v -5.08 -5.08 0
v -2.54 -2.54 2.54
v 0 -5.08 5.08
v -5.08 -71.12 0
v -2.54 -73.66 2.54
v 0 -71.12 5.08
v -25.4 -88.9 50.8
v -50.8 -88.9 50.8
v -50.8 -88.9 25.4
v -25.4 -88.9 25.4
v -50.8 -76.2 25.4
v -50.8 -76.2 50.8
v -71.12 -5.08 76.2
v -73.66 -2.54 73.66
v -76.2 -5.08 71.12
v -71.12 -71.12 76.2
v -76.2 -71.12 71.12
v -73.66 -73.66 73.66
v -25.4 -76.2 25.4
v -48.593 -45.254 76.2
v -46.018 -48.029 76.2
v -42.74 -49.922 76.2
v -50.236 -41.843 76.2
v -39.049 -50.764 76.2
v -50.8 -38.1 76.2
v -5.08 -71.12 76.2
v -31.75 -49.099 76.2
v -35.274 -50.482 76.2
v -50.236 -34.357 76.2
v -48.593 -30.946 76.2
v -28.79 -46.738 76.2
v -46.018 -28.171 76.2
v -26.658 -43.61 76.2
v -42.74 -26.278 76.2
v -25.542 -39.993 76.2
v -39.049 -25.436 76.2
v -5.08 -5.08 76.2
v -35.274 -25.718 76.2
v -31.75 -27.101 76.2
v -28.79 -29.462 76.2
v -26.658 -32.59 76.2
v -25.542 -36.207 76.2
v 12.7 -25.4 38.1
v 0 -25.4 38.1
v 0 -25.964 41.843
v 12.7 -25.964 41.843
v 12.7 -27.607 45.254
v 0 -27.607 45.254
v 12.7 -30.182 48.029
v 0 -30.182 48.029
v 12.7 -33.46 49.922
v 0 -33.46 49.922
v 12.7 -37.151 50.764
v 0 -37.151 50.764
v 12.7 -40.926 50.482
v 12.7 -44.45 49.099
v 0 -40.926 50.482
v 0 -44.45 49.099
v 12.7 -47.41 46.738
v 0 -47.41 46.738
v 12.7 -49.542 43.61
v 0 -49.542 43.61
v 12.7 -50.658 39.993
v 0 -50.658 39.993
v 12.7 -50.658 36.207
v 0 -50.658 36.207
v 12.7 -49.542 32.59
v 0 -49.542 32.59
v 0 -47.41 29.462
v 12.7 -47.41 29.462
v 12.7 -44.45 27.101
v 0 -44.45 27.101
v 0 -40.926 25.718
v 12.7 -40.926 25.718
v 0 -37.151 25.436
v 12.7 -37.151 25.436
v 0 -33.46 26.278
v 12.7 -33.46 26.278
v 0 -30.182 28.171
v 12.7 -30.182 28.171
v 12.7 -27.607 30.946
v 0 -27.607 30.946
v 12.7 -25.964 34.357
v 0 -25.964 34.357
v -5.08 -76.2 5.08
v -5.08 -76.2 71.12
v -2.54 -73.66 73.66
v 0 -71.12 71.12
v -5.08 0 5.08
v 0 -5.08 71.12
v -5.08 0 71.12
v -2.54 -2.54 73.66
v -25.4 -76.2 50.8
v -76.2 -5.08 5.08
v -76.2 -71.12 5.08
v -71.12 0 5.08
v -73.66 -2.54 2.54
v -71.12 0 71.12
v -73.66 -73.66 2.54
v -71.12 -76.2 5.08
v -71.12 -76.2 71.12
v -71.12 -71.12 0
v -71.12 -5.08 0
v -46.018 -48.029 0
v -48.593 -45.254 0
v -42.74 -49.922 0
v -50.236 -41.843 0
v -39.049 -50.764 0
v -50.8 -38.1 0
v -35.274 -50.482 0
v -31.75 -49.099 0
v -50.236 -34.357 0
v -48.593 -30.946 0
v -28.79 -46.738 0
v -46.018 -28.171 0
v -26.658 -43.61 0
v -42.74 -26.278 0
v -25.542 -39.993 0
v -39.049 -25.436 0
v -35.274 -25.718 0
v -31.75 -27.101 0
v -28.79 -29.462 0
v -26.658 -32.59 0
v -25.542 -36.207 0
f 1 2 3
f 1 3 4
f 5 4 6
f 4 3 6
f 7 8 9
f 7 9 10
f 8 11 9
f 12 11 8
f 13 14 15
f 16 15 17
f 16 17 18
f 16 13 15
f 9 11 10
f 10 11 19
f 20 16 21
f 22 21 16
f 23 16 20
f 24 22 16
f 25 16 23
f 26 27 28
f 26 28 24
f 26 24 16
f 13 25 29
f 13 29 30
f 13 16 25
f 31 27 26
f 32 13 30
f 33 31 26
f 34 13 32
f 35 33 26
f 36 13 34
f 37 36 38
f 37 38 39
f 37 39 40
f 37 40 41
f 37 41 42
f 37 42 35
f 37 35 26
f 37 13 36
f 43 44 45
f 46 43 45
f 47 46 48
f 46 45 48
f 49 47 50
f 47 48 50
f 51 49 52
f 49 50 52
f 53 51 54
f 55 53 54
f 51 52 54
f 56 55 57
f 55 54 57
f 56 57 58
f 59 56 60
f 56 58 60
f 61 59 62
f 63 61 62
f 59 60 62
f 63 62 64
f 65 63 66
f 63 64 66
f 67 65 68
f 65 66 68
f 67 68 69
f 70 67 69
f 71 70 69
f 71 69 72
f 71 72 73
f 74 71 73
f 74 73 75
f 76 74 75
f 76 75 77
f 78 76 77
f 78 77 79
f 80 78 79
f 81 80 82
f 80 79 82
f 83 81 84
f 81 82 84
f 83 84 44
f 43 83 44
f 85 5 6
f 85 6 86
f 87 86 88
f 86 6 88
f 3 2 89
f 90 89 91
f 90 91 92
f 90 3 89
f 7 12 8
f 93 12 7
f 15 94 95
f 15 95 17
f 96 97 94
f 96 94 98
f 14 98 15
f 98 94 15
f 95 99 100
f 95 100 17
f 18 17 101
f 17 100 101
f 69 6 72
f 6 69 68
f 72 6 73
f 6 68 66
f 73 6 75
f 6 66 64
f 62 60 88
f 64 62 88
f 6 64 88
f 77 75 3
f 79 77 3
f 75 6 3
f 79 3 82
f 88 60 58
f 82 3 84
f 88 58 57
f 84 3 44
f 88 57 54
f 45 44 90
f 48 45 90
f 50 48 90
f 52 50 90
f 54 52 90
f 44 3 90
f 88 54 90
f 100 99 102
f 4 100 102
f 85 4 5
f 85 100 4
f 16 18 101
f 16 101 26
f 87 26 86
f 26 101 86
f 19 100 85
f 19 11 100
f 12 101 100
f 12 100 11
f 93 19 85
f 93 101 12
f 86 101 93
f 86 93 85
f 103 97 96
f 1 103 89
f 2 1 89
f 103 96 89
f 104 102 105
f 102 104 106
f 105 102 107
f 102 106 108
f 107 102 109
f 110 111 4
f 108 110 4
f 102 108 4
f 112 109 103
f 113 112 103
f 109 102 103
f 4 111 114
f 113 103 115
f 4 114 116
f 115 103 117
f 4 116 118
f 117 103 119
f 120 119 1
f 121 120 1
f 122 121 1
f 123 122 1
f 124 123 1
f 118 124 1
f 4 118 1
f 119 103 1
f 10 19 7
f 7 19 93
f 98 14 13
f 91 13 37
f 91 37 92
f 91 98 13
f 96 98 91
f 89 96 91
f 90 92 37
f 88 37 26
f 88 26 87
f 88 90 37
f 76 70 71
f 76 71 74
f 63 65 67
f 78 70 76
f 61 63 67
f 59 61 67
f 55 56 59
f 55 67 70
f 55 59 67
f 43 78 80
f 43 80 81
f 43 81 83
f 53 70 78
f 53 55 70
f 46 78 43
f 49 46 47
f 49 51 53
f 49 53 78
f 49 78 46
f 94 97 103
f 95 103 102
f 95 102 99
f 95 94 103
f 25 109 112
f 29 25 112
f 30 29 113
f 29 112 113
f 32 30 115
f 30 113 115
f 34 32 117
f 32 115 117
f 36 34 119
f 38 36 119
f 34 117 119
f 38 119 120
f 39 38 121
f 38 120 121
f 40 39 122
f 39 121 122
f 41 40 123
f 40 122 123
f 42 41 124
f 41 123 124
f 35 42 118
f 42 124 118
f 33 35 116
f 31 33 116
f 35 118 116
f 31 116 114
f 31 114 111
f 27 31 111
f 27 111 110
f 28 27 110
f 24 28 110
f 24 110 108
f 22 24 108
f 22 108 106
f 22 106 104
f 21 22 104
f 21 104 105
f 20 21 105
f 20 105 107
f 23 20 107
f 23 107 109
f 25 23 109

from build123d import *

# Parameters (mm, degrees)
F0_W     = 76.2
F0_H     = 76.2
F1_DEPTH = 76.2
F2_W     = 25.4
F2_H     = 25.4
F3_DEPTH = 12.7
F5_D     = 25.4
F6_R     = 12.7
F7_DEPTH = 12.7
F8_SIZE  = 5.08
F9_SIZE  = 5.08
F10_SIZE = 5.08
F11_SIZE = 5.08
F12_SIZE = 5.08
F13_SIZE = 5.08
F14_SIZE = 5.08
F15_SIZE = 5.08
F16_SIZE = 5.08
F17_SIZE = 5.08


# Not quite as in the source:
# - the program builds the solid bodies; features that only make, move or delete a surface that nothing else refers to are left out


with BuildPart() as f1:
    # F0 (on Front) → F1 (new body)
    with BuildSketch(Plane.XZ):
        with Locations((-38.1, 38.1)):
            Rectangle(F0_W, F0_H)
    extrude(amount=F1_DEPTH)

    # F2 (on face) → F3 (join)
    with BuildSketch(Plane.XZ.offset(76.2)):
        with Locations((-38.1, 38.1)):
            Rectangle(F2_W, F2_H)
    extrude(amount=F3_DEPTH)

    # F5 (through all)
    with Locations(Plane.XY.offset(76.2)):
        with Locations((-38.1, -38.1)):
            Hole(F5_D / 2)

    # F6 (on face) → F7 (join)
    with BuildSketch(Plane.YZ):
        with Locations((-38.1, 38.1)):
            Circle(F6_R)
    extrude(amount=F7_DEPTH)

    # F8
    f8_edges = [f1.edges().sort_by_distance(p)[0] for p in [
        (-38.1, -76.2, 76.2),
        (0, -38.1, 76.2),
    ]]
    chamfer(f8_edges, length=F8_SIZE)

    # F9
    f9_edges = [f1.edges().sort_by_distance(p)[0] for p in [
        (-40.64, 0, 76.2),
    ]]
    chamfer(f9_edges, length=F9_SIZE)

    # F10
    f10_edges = [f1.edges().sort_by_distance(p)[0] for p in [
        (-76.2, -38.1, 76.2),
    ]]
    chamfer(f10_edges, length=F10_SIZE)

    # F11
    f11_edges = [f1.edges().sort_by_distance(p)[0] for p in [
        (0, -76.2, 35.56),
        (-76.2, -76.2, 35.56),
    ]]
    chamfer(f11_edges, length=F11_SIZE)

    # F12
    f12_edges = [f1.edges().sort_by_distance(p)[0] for p in [
        (-38.1, -76.2, 0),
    ]]
    chamfer(f12_edges, length=F12_SIZE)

    # F13
    f13_edges = [f1.edges().sort_by_distance(p)[0] for p in [
        (0, -35.56, 0),
    ]]
    chamfer(f13_edges, length=F13_SIZE)

    # F14
    f14_edges = [f1.edges().sort_by_distance(p)[0] for p in [
        (0, 0, 38.1),
    ]]
    chamfer(f14_edges, length=F14_SIZE)

    # F15
    f15_edges = [f1.edges().sort_by_distance(p)[0] for p in [
        (-76.2, 0, 35.56),
    ]]
    chamfer(f15_edges, length=F15_SIZE)

    # F16
    f16_edges = [f1.edges().sort_by_distance(p)[0] for p in [
        (-76.2, -38.1, 0),
    ]]
    chamfer(f16_edges, length=F16_SIZE)

    # F17
    f17_edges = [f1.edges().sort_by_distance(p)[0] for p in [
        (-38.1, 0, 0),
    ]]
    chamfer(f17_edges, length=F17_SIZE)


solid = f1.part
